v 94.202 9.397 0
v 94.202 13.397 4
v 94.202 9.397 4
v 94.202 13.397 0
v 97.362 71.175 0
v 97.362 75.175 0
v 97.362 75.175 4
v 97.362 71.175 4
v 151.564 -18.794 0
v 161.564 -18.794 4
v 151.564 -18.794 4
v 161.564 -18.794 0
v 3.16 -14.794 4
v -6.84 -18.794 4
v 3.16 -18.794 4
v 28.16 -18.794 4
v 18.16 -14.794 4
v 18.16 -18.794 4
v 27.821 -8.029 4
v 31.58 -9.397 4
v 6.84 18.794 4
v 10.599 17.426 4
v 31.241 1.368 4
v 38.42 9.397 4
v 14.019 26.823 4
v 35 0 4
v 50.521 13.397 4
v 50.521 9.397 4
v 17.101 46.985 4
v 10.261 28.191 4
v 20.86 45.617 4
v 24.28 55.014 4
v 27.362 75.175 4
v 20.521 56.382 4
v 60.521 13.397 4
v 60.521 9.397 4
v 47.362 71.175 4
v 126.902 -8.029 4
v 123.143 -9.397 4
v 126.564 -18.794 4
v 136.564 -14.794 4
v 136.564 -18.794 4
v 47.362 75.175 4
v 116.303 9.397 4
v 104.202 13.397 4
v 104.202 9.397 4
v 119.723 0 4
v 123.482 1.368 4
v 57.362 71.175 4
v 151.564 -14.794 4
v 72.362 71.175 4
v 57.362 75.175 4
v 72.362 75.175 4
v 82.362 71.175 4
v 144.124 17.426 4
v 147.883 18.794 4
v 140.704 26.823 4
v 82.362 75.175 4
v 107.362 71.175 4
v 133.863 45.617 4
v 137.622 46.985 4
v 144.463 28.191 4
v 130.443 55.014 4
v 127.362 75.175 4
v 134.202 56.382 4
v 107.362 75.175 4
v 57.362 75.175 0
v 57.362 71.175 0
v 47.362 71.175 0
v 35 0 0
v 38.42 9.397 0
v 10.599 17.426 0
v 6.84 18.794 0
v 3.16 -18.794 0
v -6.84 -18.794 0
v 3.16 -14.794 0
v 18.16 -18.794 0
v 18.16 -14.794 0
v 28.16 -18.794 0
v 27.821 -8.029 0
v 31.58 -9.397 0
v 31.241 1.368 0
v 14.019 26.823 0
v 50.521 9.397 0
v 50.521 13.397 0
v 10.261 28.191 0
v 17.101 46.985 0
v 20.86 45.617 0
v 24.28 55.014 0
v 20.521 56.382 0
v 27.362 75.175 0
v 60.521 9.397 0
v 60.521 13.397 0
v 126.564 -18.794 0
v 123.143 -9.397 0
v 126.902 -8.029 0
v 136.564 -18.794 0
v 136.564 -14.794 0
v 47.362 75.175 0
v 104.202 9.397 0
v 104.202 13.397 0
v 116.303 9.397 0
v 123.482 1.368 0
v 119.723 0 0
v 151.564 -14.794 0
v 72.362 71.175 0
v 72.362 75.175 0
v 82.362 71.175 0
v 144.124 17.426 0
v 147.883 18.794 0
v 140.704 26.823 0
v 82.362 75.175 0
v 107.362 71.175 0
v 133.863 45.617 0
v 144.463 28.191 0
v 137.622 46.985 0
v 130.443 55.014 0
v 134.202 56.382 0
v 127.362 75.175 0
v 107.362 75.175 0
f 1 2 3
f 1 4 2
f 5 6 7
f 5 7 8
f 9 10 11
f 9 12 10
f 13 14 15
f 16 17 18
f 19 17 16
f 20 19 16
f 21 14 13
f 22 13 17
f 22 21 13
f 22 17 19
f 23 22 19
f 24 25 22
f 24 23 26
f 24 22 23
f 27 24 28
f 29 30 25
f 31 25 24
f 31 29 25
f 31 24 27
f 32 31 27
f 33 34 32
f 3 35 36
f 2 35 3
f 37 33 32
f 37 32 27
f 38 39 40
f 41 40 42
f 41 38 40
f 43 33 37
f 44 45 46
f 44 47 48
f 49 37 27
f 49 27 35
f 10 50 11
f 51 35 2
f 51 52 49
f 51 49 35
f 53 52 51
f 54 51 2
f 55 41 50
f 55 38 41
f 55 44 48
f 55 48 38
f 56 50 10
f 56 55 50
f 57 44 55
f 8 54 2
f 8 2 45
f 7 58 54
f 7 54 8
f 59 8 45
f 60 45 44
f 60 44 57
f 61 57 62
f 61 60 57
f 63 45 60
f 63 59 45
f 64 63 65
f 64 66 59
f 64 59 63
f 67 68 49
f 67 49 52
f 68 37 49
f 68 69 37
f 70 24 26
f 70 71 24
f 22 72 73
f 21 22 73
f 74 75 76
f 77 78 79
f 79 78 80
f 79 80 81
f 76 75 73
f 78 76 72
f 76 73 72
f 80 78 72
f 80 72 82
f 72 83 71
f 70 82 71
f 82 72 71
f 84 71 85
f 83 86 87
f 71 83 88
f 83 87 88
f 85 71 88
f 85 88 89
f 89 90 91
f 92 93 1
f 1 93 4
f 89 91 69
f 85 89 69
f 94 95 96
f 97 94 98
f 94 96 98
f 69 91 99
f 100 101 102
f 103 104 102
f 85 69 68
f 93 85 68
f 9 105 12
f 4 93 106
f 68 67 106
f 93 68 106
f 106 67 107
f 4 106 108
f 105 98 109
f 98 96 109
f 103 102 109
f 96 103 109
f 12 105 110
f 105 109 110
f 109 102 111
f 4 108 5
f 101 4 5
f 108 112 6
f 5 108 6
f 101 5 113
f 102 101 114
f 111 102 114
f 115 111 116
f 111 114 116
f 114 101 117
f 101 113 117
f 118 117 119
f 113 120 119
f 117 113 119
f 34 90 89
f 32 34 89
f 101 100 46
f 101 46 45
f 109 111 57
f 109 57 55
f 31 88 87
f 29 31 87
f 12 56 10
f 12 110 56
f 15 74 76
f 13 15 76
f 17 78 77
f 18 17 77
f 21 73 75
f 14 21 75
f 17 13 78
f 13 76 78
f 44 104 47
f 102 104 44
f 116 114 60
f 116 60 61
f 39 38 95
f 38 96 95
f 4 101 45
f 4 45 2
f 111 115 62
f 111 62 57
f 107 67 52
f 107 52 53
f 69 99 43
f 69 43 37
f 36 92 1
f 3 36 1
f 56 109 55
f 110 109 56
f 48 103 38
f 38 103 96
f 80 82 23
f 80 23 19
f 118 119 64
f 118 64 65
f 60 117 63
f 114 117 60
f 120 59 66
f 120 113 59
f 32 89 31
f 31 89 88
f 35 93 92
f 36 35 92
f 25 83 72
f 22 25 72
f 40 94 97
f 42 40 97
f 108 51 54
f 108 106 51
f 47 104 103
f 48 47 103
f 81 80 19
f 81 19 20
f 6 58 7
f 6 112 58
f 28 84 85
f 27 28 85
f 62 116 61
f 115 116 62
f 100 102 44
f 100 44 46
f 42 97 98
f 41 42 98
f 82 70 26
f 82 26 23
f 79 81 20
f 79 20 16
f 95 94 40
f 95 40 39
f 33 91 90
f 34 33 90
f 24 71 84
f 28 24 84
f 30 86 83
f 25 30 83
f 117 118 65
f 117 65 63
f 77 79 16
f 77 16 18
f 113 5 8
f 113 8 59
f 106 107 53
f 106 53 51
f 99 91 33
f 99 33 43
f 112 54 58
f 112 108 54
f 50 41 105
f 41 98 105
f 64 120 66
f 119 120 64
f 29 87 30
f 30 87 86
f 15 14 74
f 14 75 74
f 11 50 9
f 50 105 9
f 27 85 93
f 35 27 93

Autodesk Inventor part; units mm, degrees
ref_plane "YZ Plane" through (0, 0, 0) normal (1, 0, 0) x (0, 1, 0)
ref_plane "XZ Plane" through (0, 0, 0) normal (0, 1, 0) x (-1, 0, 0)
ref_plane "XY Plane" through (0, 0, 0) normal (0, 0, 1) x (1, 0, 0)
sketch "Sketch1" plane through (0, 0, 0) normal (0, 0, 1) x (1, 0, 0)
  line L0 (-6.8404, -18.7939) -> (73.1596, -18.7939) construction
  line L1 (126.5636, -18.7939) -> (116.303, 9.3969)
  line L2 (27.3616, 75.1754) -> (20.5212, 56.3816)
  line L3 (20.5212, 56.3816) -> (24.28, 55.0135)
  line L4 (24.28, 55.0135) -> (20.8598, 45.6166)
  line L5 (20.8598, 45.6166) -> (17.101, 46.9846)
  line L6 (17.101, 46.9846) -> (10.2606, 28.1908)
  line L7 (10.2606, 28.1908) -> (14.0194, 26.8227)
  line L8 (14.0194, 26.8227) -> (10.5992, 17.4258)
  line L9 (10.5992, 17.4258) -> (6.8404, 18.7939)
  line L10 (6.8404, 18.7939) -> (-6.8404, -18.7939)
  line L11 (27.3616, 75.1754) -> (47.3616, 75.1754)
  line L12 (47.3616, 75.1754) -> (47.3616, 71.1754)
  line L13 (47.3616, 71.1754) -> (57.3616, 71.1754)
  line L14 (57.3616, 71.1754) -> (57.3616, 75.1754)
  line L15 (57.3616, 75.1754) -> (72.3616, 75.1754)
  line L16 (72.3616, 75.1754) -> (72.3616, 71.1754)
  line L17 (72.3616, 71.1754) -> (82.3616, 71.1754)
  line L18 (82.3616, 71.1754) -> (82.3616, 75.1754)
  line L19 (82.3616, 75.1754) -> (97.3616, 75.1754)
  line L20 (97.3616, 75.1754) -> (97.3616, 71.1754)
  line L21 (97.3616, 71.1754) -> (107.3616, 71.1754)
  line L22 (107.3616, 71.1754) -> (107.3616, 75.1754)
  line L23 (107.3616, 75.1754) -> (127.3616, 75.1754)
  line L24 (-6.8404, -18.7939) -> (3.1596, -18.7939)
  line L25 (3.1596, -18.7939) -> (3.1596, -14.7939)
  line L26 (3.1596, -14.7939) -> (18.1596, -14.7939)
  line L27 (18.1596, -14.7939) -> (18.1596, -18.7939)
  line L28 (28.1596, -18.7939) -> (18.1596, -18.7939)
  line L29 (38.4202, 9.3969) -> (35, 0)
  line L30 (35, 0) -> (31.2412, 1.3681)
  line L31 (31.2412, 1.3681) -> (27.821, -8.0288)
  line L32 (27.821, -8.0288) -> (31.5798, -9.3969)
  line L33 (31.5798, -9.3969) -> (28.1596, -18.7939)
  line L34 (38.4202, 9.3969) -> (50.5212, 9.3969)
  line L35 (50.5212, 9.3969) -> (50.5212, 13.3969)
  line L36 (50.5212, 13.3969) -> (60.5212, 13.3969)
  line L37 (60.5212, 13.3969) -> (60.5212, 9.3969)
  line L38 (116.303, 9.3969) -> (104.202, 9.3969)
  line L39 (104.202, 9.3969) -> (104.202, 13.3969)
  line L40 (104.202, 13.3969) -> (94.202, 13.3969)
  line L41 (94.202, 13.3969) -> (94.202, 9.3969)
  line L42 (60.5212, 9.3969) -> (94.202, 9.3969)
  line L43 (116.303, 9.3969) -> (119.7232, 0)
  line L44 (119.7232, 0) -> (123.482, 1.3681)
  line L45 (123.482, 1.3681) -> (126.9022, -8.0288)
  line L46 (126.9022, -8.0288) -> (123.1434, -9.3969)
  line L47 (123.1434, -9.3969) -> (126.5636, -18.7939)
  line L48 (126.5636, -18.7939) -> (136.5636, -18.7939)
  line L49 (136.5636, -18.7939) -> (136.5636, -14.7939)
  line L50 (136.5636, -14.7939) -> (151.5636, -14.7939)
  line L51 (151.5636, -14.7939) -> (151.5636, -18.7939)
  line L52 (161.5636, -18.7939) -> (151.5636, -18.7939)
  line L53 (127.3616, 75.1754) -> (134.202, 56.3816)
  line L54 (134.202, 56.3816) -> (130.4432, 55.0135)
  line L55 (130.4432, 55.0135) -> (133.8634, 45.6166)
  line L56 (133.8634, 45.6166) -> (137.6222, 46.9846)
  line L57 (137.6222, 46.9846) -> (144.4626, 28.1908)
  line L58 (144.4626, 28.1908) -> (140.7038, 26.8227)
  line L59 (140.7038, 26.8227) -> (144.124, 17.4258)
  line L60 (144.124, 17.4258) -> (147.8828, 18.7939)
  line L61 (147.8828, 18.7939) -> (161.5636, -18.7939)
  dimension "d22" = 100
  dimension "d24" = 100
  dimension "d27" = 35
  dimension "d28" = 30
  dimension "d29" = 35
  dimension "d30" = 30
  dimension "d32" = 20
  dimension "d33" = 4
  dimension "d34" = 10
  dimension "d35" = 20
  dimension "d36" = 10
  dimension "d37" = 20
  dimension "d38" = 4
  dimension "d39" = 10
  dimension "d40" = 15
  dimension "d41" = 10
  dimension "d42" = 15
  dimension "d43" = 10
  dimension "d49" = 10
  dimension "d50" = 4
  dimension "d51" = 15
  dimension "d52" = 10
  dimension "d53" = 4
  dimension "d54" = 10
  dimension "d55" = 12.101
  dimension "d56" = 4
  dimension "d57" = 10
  dimension "d58" = 12.101
  dimension "d59" = 10
  dimension "d60" = 10
  dimension "d62" = 10
  dimension "d63" = 10
  dimension "d64" = 4
  dimension "d65" = 15
  dimension "d68" = 20
  dimension "d69" = 4
  dimension "d70" = 10
  dimension "d71" = 20
  dimension "d72" = 4
  dimension "d73" = 10
extrude "Extrusion1" add sketch "Sketch1" along normal blind 4 contours L1 L46 L45 L44 L38 L39 L40 L41 L42 L37 L36 L35 L34 L29 L30 L31 L32 L33 L28 L27 L26 L25 L24 L10 L9 L8 L7 L6 L5 L4 L3 L2 L11 L12 L13 L14 L15 L16 L17 L18 L19 L20 L21 L22 L23 L53 L54 L55 L56 L57 L58 L59 L60 L61 L52 L51 L50 L49 L48
properties part number "back"
